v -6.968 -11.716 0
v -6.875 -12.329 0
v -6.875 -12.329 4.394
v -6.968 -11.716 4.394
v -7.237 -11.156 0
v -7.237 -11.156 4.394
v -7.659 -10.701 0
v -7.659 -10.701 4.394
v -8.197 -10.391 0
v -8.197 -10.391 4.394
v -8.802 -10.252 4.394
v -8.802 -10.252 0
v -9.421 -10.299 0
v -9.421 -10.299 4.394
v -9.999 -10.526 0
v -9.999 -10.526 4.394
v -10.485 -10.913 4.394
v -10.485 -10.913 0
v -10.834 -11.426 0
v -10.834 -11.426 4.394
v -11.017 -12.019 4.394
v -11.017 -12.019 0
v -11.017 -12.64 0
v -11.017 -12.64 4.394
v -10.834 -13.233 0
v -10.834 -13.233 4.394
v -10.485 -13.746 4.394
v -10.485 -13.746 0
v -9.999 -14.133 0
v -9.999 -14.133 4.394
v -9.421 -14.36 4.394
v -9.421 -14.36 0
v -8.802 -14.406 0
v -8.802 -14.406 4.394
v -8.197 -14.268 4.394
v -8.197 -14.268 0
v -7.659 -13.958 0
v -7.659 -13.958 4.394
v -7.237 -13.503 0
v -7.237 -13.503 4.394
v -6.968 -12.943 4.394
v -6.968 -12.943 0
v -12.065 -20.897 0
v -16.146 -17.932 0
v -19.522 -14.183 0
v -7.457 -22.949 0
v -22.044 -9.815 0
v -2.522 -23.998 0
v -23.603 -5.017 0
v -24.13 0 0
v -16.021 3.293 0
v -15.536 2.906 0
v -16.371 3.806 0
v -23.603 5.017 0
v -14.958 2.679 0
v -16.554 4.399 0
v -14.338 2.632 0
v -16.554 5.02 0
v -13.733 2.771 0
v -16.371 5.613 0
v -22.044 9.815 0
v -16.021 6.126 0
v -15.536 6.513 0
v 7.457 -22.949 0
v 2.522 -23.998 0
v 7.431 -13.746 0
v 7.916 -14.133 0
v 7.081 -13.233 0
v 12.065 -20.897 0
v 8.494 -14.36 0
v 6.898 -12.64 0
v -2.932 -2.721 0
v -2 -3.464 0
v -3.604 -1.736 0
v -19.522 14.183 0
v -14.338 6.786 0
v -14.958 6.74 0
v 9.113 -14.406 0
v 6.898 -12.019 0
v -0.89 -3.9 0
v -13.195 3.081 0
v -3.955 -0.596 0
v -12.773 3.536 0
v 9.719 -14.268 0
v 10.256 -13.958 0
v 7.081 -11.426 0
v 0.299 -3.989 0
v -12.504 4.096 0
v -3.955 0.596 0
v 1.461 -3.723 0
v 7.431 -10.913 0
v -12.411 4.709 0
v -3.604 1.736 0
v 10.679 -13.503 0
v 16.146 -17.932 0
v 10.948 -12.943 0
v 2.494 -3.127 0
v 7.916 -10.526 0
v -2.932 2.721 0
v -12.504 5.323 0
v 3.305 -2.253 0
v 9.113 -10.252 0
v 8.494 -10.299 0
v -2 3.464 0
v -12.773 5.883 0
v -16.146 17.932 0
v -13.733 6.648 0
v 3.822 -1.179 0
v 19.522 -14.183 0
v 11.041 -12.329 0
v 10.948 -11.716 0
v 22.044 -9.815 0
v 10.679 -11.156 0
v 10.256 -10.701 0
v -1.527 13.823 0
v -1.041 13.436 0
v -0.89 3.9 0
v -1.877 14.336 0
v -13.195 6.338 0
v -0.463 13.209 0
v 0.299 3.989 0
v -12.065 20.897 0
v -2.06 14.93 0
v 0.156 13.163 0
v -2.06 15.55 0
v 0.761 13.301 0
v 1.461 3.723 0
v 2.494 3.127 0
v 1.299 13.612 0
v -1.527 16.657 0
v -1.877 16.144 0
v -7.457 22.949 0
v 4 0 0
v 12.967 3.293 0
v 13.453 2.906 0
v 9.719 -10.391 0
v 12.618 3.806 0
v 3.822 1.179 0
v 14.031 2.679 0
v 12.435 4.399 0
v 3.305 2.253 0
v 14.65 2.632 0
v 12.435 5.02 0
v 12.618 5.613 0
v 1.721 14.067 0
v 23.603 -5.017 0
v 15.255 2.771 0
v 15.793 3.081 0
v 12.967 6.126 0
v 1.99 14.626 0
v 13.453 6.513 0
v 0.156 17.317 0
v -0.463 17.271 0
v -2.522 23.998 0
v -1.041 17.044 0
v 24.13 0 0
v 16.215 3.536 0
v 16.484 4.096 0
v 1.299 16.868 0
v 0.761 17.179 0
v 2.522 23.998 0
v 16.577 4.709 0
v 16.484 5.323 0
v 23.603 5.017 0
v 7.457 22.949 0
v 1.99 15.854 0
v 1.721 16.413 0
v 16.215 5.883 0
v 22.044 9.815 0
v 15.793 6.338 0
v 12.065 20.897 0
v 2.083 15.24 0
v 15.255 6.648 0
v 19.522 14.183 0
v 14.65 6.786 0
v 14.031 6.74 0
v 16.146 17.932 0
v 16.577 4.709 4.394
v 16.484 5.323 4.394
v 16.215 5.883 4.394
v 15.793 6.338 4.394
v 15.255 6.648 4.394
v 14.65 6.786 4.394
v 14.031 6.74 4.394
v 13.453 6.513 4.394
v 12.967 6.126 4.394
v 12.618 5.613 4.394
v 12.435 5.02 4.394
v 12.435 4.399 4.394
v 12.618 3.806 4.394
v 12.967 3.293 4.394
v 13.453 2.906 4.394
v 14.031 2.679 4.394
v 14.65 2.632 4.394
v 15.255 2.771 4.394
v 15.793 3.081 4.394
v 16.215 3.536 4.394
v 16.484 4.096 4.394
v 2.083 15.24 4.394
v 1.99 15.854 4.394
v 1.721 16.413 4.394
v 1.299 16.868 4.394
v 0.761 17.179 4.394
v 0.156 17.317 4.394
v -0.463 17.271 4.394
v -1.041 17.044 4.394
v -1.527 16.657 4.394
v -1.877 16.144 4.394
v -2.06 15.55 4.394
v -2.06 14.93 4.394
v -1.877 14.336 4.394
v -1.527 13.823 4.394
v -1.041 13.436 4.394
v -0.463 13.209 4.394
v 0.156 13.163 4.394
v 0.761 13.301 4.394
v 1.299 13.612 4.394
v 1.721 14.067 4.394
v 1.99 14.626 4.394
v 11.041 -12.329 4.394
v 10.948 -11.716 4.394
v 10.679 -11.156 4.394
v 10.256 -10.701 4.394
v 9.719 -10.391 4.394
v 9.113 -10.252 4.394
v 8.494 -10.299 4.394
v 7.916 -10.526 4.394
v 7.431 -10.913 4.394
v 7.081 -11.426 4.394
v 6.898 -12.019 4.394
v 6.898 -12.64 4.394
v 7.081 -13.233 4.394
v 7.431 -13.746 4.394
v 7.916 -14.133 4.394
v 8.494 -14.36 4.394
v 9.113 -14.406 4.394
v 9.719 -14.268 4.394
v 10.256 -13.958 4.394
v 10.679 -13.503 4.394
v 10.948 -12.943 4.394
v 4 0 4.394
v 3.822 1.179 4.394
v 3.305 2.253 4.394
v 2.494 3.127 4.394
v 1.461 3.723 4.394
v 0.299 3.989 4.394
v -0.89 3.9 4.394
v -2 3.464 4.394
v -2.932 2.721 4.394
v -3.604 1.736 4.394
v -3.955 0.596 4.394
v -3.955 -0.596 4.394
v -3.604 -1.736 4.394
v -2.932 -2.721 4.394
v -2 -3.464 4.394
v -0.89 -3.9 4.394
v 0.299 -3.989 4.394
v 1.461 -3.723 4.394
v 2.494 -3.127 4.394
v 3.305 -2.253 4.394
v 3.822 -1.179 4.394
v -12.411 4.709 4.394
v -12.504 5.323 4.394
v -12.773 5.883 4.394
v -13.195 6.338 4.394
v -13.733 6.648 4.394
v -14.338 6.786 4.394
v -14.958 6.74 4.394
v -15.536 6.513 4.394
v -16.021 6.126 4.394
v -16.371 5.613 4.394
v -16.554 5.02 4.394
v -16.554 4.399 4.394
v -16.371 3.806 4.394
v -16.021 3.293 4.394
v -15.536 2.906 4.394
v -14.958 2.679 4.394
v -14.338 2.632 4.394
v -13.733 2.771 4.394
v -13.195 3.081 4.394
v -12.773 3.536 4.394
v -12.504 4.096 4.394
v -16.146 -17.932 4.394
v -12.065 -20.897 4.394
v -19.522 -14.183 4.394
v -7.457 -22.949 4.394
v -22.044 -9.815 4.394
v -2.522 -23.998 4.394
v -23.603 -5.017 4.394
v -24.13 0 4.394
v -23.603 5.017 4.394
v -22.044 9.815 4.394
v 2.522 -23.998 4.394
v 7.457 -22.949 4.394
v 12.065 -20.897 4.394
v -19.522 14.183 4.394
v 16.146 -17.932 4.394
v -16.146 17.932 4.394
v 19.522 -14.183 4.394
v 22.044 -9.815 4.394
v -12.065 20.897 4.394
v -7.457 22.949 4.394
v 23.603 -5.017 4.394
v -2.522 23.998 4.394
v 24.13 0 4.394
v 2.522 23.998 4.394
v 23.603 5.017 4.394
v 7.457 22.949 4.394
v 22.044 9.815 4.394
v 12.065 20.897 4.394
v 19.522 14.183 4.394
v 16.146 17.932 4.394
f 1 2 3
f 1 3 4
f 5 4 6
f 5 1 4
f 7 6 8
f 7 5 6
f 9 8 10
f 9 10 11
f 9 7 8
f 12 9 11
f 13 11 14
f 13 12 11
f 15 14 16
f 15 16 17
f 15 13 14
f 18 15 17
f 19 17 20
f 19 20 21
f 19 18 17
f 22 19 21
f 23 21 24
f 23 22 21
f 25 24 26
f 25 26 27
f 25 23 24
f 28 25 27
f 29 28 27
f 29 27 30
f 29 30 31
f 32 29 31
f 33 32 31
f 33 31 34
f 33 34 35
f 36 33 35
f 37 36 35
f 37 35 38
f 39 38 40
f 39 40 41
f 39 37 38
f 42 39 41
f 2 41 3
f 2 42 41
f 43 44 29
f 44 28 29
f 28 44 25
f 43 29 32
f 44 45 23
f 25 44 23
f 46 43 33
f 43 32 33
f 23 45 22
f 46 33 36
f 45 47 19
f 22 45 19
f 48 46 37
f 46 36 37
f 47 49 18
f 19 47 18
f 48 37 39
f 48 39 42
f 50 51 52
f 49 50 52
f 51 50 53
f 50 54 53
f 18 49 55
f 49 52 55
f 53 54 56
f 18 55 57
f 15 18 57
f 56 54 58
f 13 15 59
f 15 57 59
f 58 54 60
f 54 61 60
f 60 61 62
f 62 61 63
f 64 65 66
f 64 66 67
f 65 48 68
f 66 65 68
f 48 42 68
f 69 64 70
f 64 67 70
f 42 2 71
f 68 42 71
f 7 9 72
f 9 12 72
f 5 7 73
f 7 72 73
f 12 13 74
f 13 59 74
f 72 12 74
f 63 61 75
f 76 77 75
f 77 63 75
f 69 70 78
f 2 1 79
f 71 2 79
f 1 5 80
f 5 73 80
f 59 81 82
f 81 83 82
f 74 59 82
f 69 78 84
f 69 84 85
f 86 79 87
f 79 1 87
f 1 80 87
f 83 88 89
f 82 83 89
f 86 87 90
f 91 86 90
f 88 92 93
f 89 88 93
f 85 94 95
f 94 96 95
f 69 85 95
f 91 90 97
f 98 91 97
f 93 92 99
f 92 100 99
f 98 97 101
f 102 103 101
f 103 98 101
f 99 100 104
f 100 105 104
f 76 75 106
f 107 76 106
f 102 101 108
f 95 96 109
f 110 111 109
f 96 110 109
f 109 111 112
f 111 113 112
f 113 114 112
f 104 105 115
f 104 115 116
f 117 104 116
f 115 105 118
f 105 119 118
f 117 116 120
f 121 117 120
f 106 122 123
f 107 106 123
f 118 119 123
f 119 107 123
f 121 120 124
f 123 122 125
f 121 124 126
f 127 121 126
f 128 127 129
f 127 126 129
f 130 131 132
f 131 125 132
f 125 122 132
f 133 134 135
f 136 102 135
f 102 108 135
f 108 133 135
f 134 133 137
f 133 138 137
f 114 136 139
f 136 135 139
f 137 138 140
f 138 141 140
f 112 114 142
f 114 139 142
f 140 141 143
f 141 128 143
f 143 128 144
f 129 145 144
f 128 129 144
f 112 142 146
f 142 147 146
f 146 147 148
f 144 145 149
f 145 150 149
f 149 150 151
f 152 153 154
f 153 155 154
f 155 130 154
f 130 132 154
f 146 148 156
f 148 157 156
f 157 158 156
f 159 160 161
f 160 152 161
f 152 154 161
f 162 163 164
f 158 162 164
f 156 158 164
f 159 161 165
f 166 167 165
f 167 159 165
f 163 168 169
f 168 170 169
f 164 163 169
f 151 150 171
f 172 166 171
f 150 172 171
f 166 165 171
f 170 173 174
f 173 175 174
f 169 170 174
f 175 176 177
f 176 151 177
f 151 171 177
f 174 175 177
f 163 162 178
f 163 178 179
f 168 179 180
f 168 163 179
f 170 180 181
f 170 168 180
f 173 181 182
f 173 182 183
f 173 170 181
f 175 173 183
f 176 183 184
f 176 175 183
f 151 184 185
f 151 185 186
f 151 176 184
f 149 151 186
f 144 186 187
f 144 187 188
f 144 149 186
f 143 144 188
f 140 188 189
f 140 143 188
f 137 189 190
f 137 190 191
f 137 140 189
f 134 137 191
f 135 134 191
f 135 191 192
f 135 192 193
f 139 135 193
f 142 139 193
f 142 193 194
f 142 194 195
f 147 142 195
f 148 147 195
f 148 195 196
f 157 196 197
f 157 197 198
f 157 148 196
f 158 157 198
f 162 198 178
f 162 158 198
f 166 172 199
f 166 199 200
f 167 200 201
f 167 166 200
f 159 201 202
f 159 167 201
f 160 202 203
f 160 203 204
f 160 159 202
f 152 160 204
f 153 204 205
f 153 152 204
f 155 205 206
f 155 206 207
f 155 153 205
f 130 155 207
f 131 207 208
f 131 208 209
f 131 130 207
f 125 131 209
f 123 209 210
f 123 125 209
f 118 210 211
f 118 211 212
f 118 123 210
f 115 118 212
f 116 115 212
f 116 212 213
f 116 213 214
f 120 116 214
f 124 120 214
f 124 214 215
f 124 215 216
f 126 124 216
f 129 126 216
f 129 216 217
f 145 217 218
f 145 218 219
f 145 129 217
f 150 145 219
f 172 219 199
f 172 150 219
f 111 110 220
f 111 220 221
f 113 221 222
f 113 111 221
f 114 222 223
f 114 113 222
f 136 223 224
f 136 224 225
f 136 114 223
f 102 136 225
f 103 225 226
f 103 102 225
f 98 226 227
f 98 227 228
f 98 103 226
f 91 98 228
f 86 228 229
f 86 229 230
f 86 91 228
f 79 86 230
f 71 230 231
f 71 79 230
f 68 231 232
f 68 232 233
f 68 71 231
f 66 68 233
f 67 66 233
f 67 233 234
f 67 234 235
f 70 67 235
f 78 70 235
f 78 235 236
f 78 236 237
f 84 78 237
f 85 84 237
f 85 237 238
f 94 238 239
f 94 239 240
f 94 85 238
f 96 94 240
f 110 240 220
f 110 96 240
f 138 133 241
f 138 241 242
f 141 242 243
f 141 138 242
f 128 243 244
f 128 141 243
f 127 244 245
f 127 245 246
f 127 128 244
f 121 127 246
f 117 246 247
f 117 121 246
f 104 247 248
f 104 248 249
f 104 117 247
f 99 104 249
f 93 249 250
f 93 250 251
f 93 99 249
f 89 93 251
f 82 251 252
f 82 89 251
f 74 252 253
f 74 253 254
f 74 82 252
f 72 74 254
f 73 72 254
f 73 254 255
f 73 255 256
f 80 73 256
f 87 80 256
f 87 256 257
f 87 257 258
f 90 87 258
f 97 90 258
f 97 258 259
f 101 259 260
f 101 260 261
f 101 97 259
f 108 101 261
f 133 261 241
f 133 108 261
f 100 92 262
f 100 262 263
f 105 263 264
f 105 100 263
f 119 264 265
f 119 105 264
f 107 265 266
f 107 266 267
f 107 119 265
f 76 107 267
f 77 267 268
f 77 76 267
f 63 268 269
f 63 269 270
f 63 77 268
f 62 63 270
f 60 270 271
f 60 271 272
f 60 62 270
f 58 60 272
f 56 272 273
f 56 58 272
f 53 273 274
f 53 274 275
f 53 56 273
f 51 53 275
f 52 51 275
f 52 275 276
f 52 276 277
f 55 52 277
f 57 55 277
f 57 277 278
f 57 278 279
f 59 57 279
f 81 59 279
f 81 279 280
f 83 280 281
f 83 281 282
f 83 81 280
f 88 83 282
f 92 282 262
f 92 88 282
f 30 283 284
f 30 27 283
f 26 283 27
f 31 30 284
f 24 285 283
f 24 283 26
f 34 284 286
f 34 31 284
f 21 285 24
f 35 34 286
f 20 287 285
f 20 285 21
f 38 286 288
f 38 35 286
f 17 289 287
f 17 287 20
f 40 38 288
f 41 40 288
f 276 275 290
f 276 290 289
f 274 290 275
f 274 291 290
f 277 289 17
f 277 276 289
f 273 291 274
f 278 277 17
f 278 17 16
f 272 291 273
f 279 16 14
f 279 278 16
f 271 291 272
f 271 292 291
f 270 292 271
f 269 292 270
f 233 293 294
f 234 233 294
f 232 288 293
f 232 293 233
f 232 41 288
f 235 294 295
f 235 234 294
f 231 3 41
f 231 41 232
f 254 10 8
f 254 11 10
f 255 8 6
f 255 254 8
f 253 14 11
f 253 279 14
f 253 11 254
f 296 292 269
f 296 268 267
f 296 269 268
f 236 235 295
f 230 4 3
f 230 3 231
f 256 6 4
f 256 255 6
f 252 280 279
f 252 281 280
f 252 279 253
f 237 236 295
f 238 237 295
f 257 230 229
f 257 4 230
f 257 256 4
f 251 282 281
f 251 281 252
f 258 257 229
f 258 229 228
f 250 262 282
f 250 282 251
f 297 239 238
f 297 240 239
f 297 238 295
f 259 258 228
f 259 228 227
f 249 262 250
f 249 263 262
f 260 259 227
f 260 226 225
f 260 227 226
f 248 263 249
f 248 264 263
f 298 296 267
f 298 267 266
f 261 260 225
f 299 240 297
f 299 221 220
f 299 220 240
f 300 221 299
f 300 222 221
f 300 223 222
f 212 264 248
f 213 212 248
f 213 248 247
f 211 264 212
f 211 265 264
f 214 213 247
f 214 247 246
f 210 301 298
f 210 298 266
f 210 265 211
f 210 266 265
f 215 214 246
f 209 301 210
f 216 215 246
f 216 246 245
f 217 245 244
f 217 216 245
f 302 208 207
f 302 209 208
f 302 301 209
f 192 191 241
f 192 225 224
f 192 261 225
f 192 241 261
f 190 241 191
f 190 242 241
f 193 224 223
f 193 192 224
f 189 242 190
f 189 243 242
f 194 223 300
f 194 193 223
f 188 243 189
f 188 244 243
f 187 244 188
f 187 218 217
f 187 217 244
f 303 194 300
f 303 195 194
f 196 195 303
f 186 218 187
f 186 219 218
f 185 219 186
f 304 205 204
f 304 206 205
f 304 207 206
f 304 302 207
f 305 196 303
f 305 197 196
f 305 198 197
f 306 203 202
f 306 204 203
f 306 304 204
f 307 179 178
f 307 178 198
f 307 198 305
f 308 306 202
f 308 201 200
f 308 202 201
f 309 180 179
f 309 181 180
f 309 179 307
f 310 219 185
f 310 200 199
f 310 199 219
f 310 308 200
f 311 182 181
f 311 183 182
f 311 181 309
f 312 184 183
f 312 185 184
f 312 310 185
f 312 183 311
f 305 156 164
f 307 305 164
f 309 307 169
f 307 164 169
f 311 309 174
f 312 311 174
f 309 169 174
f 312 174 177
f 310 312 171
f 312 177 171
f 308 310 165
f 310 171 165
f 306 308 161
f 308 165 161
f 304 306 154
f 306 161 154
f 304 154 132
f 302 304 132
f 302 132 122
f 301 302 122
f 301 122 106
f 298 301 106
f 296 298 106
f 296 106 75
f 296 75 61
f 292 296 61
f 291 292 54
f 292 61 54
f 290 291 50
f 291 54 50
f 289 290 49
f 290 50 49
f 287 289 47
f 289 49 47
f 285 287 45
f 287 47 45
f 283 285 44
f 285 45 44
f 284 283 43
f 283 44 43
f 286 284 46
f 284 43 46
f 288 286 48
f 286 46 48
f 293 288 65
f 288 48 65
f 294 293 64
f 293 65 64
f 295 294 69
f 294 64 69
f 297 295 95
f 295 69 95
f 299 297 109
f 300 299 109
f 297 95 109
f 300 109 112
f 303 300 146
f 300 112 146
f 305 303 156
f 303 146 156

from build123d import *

# Parameters (mm, degrees)
SKETCH1_R           = 24.13
SKETCH1_R_2         = 2.0828
SKETCH1_R_3         = 4
BOSS_EXTRUDE1_DEPTH = 4.3942


with BuildPart() as part:
    # Sketch1 → Boss-Extrude1 (new body)
    with BuildSketch(Plane.XY):
        Circle(SKETCH1_R)
        with Locations((0, 15.24)):
            Circle(SKETCH1_R_2, mode=Mode.SUBTRACT)
        with Locations((14.494101308, 4.709418994)):
            Circle(SKETCH1_R_2, mode=Mode.SUBTRACT)
        with Locations((8.957847245, -12.329418994)):
            Circle(SKETCH1_R_2, mode=Mode.SUBTRACT)
        with Locations((-8.957847245, -12.329418994)):
            Circle(SKETCH1_R_2, mode=Mode.SUBTRACT)
        with Locations((-14.494101308, 4.709418994)):
            Circle(SKETCH1_R_2, mode=Mode.SUBTRACT)
        Circle(SKETCH1_R_3, mode=Mode.SUBTRACT)
    extrude(amount=BOSS_EXTRUDE1_DEPTH)


solid = part.part
